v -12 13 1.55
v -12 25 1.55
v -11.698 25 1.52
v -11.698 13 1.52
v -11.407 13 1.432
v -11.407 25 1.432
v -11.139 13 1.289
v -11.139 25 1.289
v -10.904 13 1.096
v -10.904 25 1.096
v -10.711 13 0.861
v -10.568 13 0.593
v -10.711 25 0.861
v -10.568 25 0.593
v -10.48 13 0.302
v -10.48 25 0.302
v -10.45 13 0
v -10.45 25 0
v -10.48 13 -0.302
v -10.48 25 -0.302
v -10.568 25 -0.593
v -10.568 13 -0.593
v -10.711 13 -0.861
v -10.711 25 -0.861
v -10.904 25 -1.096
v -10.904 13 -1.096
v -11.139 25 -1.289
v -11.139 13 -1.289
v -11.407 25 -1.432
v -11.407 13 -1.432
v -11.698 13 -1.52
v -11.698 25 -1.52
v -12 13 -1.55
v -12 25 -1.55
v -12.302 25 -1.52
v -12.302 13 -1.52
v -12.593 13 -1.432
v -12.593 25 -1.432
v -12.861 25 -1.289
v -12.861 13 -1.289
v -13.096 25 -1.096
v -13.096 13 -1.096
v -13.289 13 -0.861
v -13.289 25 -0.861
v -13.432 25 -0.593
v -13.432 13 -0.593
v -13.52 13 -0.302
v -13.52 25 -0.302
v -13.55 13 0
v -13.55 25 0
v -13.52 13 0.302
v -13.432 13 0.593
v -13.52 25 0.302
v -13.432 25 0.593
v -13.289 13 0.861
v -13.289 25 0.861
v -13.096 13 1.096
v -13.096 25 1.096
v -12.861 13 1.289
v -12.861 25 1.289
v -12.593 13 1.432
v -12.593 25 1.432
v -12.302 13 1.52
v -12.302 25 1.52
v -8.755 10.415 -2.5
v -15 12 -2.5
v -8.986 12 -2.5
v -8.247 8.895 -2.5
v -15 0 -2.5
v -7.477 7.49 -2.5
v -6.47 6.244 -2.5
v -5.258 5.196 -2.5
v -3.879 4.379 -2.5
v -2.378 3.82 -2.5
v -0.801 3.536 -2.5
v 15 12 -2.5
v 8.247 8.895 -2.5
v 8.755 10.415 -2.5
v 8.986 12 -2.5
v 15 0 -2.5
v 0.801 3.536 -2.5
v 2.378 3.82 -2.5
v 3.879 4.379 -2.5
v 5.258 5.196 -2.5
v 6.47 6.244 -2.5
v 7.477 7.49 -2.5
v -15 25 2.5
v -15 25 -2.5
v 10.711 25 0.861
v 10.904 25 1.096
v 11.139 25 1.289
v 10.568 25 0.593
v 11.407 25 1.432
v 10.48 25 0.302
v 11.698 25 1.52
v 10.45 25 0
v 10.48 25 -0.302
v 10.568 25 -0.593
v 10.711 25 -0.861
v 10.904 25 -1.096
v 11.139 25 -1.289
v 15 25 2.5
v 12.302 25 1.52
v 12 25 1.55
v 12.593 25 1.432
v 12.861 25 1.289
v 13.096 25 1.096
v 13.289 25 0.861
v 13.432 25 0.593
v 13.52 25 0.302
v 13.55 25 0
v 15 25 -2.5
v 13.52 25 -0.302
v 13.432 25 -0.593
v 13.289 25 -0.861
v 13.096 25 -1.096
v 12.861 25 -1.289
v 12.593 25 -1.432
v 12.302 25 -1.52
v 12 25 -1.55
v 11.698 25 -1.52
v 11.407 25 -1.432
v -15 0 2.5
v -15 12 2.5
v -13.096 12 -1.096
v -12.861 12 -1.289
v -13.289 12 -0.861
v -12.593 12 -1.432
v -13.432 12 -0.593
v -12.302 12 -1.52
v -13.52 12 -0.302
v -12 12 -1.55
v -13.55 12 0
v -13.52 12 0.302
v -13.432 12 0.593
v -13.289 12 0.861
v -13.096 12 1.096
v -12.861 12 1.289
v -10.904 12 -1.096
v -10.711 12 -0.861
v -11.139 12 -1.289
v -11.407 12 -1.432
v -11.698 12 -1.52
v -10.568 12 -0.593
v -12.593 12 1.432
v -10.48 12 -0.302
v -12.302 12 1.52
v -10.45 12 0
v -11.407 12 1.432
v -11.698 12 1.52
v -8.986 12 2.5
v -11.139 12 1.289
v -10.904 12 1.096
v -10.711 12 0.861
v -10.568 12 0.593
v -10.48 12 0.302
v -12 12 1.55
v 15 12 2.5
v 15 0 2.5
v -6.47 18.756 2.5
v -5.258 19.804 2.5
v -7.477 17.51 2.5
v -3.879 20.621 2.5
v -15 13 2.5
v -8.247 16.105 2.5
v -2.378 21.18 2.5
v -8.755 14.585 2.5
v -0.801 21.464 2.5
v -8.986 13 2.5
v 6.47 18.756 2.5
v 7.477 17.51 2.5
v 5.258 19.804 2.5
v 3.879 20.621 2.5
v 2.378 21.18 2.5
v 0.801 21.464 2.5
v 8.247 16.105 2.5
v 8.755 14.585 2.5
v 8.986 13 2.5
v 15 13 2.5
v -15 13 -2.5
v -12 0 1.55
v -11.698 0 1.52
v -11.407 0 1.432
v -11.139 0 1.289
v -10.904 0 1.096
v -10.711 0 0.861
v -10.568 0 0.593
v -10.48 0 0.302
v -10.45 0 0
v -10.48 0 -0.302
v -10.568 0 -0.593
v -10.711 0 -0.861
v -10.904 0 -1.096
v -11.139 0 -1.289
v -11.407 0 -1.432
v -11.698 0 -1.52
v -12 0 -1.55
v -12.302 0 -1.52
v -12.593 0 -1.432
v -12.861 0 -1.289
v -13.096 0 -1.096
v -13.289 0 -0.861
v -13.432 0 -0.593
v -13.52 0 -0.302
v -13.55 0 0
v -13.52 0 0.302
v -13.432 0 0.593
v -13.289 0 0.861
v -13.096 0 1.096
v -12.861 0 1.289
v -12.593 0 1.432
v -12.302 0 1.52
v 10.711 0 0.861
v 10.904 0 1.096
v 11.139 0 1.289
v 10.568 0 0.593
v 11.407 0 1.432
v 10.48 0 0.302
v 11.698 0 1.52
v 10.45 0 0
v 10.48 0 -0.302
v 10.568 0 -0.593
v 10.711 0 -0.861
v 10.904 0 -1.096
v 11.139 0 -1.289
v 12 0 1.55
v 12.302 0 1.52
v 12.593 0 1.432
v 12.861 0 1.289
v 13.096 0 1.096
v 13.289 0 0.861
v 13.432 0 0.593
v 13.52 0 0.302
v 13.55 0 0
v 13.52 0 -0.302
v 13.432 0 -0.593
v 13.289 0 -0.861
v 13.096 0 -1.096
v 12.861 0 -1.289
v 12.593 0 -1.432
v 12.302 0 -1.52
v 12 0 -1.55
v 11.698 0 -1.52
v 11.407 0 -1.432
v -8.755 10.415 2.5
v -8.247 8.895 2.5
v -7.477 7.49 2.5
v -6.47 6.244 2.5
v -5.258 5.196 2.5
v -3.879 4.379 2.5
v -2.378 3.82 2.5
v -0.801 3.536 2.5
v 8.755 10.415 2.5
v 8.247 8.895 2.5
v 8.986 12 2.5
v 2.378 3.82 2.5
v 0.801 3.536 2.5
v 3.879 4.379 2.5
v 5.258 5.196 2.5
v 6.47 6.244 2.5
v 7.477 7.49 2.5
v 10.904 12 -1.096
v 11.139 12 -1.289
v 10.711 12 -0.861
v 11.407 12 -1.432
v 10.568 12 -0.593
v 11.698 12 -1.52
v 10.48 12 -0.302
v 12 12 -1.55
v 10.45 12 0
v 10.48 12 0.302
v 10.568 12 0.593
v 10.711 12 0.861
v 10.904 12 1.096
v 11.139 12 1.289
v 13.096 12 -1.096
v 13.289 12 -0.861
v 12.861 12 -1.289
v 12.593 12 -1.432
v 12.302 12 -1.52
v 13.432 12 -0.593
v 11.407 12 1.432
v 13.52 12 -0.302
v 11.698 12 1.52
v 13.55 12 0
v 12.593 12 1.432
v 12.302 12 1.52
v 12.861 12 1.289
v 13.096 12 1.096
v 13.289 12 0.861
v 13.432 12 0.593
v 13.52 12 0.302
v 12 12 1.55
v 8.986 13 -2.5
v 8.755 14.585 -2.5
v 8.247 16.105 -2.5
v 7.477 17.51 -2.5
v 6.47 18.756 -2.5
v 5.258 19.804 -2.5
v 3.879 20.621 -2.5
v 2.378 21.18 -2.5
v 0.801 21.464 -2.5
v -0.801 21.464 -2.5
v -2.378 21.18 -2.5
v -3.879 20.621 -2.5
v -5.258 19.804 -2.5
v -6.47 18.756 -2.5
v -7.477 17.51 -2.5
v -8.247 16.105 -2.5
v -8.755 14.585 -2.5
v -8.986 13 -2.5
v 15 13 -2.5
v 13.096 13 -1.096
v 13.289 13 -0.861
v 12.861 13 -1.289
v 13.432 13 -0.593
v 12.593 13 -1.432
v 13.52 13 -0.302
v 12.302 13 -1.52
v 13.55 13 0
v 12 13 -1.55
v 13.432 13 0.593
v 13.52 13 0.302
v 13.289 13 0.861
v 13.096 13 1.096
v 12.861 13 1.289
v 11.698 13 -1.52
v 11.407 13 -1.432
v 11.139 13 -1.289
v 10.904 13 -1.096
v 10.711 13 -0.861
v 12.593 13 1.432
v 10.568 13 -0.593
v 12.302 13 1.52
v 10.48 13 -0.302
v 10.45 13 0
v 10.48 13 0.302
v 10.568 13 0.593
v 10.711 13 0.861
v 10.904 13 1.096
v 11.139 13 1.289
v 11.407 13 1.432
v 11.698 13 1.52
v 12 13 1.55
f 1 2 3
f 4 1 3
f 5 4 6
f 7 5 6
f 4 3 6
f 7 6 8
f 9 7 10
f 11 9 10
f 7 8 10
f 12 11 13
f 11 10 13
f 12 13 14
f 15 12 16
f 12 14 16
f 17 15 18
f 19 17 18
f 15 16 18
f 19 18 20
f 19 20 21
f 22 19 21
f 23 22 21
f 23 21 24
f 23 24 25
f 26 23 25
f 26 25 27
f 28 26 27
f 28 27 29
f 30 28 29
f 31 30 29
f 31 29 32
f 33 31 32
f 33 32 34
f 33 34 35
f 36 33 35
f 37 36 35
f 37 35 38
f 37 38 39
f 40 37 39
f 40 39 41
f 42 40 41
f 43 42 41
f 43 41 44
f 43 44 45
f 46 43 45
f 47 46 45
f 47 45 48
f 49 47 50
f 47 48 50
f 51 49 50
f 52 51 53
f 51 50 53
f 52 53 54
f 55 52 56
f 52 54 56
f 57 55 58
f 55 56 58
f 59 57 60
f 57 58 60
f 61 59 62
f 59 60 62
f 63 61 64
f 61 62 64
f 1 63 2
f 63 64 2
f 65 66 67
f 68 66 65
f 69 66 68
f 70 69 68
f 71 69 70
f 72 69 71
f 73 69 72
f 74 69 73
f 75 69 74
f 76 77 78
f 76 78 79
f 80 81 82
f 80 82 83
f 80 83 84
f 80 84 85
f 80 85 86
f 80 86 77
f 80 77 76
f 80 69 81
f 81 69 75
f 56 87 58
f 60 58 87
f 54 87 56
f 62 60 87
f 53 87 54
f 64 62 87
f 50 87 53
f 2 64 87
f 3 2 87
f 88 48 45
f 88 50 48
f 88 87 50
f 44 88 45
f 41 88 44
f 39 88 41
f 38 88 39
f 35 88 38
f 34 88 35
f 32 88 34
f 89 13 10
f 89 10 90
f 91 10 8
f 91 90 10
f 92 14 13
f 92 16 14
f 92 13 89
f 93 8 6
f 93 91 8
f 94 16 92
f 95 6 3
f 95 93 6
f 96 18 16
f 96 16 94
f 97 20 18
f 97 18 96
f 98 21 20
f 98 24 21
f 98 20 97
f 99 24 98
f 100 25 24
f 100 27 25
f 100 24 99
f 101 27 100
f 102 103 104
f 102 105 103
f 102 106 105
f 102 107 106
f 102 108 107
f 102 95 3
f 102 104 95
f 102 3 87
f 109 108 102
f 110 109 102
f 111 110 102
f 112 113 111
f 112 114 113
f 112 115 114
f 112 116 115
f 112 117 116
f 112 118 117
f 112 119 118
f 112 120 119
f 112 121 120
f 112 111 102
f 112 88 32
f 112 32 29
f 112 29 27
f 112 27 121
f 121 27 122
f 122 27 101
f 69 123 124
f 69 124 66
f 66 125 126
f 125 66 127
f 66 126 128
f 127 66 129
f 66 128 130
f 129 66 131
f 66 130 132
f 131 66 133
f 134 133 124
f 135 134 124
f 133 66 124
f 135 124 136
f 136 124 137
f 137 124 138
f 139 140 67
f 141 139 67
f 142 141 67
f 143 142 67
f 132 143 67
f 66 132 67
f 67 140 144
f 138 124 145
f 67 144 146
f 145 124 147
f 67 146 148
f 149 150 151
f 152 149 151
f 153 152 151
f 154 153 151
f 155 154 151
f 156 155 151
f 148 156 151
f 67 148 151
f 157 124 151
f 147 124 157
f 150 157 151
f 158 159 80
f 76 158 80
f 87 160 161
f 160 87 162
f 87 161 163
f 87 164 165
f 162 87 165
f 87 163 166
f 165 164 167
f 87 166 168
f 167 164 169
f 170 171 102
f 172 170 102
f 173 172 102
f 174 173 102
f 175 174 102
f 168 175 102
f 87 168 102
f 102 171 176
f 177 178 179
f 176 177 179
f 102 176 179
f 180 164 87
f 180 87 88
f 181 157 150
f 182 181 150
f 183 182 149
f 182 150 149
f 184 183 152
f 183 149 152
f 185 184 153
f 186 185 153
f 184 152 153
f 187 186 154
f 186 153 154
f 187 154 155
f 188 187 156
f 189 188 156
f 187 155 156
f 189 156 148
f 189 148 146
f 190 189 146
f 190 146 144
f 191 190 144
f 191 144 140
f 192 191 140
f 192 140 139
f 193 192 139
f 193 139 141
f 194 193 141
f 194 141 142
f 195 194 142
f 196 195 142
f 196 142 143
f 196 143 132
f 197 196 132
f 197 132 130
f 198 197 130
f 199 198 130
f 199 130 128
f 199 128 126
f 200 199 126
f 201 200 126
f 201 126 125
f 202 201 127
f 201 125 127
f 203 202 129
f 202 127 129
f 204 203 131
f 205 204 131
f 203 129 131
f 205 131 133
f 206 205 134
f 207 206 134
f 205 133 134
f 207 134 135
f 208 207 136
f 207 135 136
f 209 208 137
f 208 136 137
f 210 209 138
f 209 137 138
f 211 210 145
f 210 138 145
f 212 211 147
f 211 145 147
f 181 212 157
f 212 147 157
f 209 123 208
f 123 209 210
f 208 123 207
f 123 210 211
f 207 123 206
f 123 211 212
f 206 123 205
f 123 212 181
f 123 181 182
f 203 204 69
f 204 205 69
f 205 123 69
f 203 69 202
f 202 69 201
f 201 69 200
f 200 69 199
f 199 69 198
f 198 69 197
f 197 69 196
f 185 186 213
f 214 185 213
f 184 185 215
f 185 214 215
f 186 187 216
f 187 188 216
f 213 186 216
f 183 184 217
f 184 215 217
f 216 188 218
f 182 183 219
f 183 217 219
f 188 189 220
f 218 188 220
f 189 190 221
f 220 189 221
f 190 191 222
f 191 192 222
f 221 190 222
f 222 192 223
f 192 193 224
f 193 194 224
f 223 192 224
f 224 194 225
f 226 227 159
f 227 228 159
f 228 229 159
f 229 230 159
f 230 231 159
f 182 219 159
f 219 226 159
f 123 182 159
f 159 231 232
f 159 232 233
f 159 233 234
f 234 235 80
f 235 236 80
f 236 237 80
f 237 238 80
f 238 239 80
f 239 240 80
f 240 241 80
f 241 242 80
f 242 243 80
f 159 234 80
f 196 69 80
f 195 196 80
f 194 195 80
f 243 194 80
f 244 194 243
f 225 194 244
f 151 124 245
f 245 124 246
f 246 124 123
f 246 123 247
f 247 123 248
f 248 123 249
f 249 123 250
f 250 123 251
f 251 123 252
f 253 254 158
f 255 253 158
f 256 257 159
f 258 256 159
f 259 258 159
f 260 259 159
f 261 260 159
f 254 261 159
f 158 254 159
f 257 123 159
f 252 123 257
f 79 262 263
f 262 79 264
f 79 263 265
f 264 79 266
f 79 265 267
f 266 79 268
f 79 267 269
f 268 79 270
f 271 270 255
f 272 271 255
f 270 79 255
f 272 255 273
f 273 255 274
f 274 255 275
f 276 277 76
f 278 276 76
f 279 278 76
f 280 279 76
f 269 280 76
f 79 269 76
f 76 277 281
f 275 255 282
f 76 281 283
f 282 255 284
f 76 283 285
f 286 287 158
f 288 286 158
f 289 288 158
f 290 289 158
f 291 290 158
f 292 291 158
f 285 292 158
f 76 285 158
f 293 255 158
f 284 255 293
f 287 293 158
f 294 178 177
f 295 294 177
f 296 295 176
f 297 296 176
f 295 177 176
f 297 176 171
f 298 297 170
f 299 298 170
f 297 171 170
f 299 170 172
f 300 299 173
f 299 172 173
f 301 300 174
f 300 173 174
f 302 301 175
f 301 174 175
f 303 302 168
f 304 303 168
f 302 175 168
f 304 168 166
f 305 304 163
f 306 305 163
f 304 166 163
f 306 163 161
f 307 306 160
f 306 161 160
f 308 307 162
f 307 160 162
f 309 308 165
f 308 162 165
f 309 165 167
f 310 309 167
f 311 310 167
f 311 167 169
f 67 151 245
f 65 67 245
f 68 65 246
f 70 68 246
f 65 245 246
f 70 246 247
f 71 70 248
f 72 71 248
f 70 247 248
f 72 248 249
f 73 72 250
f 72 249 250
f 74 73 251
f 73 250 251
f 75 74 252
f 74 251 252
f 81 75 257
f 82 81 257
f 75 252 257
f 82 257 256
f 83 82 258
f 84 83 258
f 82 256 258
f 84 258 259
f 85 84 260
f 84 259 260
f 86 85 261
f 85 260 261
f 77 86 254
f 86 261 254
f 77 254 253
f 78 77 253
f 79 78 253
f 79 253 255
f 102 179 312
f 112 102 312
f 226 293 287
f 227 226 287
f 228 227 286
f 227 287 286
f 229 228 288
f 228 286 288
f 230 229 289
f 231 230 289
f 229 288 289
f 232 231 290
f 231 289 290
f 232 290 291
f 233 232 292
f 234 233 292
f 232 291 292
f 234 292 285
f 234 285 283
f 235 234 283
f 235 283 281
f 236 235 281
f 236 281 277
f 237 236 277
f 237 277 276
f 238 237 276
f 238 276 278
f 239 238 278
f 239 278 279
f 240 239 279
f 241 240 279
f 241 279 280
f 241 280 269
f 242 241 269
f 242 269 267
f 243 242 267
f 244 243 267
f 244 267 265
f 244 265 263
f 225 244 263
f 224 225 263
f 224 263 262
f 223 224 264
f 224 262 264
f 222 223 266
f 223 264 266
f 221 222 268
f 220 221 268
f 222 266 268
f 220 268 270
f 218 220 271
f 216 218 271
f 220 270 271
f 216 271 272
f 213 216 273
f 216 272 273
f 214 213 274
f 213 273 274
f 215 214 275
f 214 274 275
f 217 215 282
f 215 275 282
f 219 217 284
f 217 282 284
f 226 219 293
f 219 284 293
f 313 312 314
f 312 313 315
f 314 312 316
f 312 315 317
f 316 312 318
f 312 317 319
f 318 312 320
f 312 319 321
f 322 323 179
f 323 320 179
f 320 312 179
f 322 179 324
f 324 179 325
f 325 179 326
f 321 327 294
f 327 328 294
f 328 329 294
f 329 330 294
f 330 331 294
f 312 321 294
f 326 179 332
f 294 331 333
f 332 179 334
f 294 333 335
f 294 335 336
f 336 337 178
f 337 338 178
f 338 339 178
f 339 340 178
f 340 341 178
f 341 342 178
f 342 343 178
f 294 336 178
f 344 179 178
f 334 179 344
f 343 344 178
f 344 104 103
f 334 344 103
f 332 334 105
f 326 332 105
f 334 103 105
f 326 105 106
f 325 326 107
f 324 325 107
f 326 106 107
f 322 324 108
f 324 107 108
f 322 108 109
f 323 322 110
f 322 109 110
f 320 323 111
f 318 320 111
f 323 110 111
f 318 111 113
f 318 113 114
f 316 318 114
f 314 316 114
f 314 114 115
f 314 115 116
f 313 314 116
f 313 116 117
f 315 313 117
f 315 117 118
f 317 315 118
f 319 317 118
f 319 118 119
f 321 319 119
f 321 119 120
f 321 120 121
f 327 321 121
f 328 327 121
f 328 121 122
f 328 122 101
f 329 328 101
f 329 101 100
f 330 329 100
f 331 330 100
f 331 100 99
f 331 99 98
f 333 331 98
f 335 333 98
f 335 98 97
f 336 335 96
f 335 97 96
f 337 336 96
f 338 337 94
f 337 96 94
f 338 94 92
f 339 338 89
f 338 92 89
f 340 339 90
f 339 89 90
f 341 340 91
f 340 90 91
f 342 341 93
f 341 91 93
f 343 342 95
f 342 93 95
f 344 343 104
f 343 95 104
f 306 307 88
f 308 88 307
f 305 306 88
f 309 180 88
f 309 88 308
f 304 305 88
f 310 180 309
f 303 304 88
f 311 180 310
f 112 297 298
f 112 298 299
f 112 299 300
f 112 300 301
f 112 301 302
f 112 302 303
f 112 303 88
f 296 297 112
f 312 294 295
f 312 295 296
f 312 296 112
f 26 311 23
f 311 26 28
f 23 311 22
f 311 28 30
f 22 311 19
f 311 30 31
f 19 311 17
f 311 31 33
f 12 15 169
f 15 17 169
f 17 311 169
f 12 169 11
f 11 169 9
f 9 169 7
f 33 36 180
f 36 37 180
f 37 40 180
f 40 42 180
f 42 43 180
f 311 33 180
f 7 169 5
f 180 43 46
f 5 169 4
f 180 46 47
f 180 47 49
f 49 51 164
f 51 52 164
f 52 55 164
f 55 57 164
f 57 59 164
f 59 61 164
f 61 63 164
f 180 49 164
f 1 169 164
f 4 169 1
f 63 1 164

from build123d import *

# Parameters (mm, degrees)
SKETCH_1_W          = 30
SKETCH_1_H          = 5
EXTRUDE_1_DEPTH     = 25
CUT_EXTRUDE_1_DEPTH = 21
SKETCH_3_R          = 1.55
CUT_EXTRUDE_2_DEPTH = 41


with BuildPart() as part:
    # 草图1 → 凸台-拉伸1 (new body)
    with BuildSketch(Plane(origin=(0, 0, 0), x_dir=(1, 0, 0), z_dir=(0, 1, 0))):
        Rectangle(SKETCH_1_W, SKETCH_1_H)
    extrude(amount=EXTRUDE_1_DEPTH)

    # 草图2 → 切除-拉伸1 (cut)
    with BuildSketch(Plane.XY.offset(2.5)):
        with BuildLine():
            Line((-15, 12), (-8.986100378, 12))
            ThreePointArc((-8.986100378, 12), (0, 3.5), (8.986100378, 12))
            Line((8.986100378, 12), (15, 12))
            Line((15, 12), (15, 13))
            Line((15, 13), (8.986100378, 13))
            ThreePointArc((8.986100378, 13), (0, 21.5), (-8.986100378, 13))
            Line((-8.986100378, 13), (-15, 13))
            Line((-15, 13), (-15, 12))
        make_face()
    extrude(amount=-CUT_EXTRUDE_1_DEPTH, mode=Mode.SUBTRACT)


with BuildPart() as cut_extrude_1_piece_1:
    # of the separate pieces the step leaves, piece 1, a body of its own (cut_extrude_1_pieces)
    add(part.part.solids().sort_by_distance((15, 0, 2.5))[0])


with BuildPart() as cut_extrude_1_piece_2:
    # of the separate pieces the step leaves, piece 2, a body of its own (cut_extrude_1_pieces)
    add(part.part.solids().sort_by_distance((15, 13, 2.5))[0])


with BuildPart() as cut_extrude_2_tool:
    # 草图3 → 切除-拉伸2 (new body)
    with BuildSketch(Plane(origin=(0, 25, 0), x_dir=(1, 0, 0), z_dir=(0, 1, 0))):
        with Locations(Location((-12, 0, 0), (0, 0, 270))):
            Circle(SKETCH_3_R)
        with Locations(Location((12, 0, 0), (0, 0, 270))):
            Circle(SKETCH_3_R)
    extrude(amount=-CUT_EXTRUDE_2_DEPTH)


with BuildPart() as cut_extrude_1_piece_1_1:
    add(cut_extrude_1_piece_1.part)

    # 切除-拉伸2: cut by cut_extrude_2_tool
    add(cut_extrude_2_tool.part, mode=Mode.SUBTRACT)


with BuildPart() as cut_extrude_1_piece_2_1:
    add(cut_extrude_1_piece_2.part)

    # 切除-拉伸2: cut by cut_extrude_2_tool
    add(cut_extrude_2_tool.part, mode=Mode.SUBTRACT)


solid = Compound([cut_extrude_1_piece_1_1.part, cut_extrude_1_piece_2_1.part])
